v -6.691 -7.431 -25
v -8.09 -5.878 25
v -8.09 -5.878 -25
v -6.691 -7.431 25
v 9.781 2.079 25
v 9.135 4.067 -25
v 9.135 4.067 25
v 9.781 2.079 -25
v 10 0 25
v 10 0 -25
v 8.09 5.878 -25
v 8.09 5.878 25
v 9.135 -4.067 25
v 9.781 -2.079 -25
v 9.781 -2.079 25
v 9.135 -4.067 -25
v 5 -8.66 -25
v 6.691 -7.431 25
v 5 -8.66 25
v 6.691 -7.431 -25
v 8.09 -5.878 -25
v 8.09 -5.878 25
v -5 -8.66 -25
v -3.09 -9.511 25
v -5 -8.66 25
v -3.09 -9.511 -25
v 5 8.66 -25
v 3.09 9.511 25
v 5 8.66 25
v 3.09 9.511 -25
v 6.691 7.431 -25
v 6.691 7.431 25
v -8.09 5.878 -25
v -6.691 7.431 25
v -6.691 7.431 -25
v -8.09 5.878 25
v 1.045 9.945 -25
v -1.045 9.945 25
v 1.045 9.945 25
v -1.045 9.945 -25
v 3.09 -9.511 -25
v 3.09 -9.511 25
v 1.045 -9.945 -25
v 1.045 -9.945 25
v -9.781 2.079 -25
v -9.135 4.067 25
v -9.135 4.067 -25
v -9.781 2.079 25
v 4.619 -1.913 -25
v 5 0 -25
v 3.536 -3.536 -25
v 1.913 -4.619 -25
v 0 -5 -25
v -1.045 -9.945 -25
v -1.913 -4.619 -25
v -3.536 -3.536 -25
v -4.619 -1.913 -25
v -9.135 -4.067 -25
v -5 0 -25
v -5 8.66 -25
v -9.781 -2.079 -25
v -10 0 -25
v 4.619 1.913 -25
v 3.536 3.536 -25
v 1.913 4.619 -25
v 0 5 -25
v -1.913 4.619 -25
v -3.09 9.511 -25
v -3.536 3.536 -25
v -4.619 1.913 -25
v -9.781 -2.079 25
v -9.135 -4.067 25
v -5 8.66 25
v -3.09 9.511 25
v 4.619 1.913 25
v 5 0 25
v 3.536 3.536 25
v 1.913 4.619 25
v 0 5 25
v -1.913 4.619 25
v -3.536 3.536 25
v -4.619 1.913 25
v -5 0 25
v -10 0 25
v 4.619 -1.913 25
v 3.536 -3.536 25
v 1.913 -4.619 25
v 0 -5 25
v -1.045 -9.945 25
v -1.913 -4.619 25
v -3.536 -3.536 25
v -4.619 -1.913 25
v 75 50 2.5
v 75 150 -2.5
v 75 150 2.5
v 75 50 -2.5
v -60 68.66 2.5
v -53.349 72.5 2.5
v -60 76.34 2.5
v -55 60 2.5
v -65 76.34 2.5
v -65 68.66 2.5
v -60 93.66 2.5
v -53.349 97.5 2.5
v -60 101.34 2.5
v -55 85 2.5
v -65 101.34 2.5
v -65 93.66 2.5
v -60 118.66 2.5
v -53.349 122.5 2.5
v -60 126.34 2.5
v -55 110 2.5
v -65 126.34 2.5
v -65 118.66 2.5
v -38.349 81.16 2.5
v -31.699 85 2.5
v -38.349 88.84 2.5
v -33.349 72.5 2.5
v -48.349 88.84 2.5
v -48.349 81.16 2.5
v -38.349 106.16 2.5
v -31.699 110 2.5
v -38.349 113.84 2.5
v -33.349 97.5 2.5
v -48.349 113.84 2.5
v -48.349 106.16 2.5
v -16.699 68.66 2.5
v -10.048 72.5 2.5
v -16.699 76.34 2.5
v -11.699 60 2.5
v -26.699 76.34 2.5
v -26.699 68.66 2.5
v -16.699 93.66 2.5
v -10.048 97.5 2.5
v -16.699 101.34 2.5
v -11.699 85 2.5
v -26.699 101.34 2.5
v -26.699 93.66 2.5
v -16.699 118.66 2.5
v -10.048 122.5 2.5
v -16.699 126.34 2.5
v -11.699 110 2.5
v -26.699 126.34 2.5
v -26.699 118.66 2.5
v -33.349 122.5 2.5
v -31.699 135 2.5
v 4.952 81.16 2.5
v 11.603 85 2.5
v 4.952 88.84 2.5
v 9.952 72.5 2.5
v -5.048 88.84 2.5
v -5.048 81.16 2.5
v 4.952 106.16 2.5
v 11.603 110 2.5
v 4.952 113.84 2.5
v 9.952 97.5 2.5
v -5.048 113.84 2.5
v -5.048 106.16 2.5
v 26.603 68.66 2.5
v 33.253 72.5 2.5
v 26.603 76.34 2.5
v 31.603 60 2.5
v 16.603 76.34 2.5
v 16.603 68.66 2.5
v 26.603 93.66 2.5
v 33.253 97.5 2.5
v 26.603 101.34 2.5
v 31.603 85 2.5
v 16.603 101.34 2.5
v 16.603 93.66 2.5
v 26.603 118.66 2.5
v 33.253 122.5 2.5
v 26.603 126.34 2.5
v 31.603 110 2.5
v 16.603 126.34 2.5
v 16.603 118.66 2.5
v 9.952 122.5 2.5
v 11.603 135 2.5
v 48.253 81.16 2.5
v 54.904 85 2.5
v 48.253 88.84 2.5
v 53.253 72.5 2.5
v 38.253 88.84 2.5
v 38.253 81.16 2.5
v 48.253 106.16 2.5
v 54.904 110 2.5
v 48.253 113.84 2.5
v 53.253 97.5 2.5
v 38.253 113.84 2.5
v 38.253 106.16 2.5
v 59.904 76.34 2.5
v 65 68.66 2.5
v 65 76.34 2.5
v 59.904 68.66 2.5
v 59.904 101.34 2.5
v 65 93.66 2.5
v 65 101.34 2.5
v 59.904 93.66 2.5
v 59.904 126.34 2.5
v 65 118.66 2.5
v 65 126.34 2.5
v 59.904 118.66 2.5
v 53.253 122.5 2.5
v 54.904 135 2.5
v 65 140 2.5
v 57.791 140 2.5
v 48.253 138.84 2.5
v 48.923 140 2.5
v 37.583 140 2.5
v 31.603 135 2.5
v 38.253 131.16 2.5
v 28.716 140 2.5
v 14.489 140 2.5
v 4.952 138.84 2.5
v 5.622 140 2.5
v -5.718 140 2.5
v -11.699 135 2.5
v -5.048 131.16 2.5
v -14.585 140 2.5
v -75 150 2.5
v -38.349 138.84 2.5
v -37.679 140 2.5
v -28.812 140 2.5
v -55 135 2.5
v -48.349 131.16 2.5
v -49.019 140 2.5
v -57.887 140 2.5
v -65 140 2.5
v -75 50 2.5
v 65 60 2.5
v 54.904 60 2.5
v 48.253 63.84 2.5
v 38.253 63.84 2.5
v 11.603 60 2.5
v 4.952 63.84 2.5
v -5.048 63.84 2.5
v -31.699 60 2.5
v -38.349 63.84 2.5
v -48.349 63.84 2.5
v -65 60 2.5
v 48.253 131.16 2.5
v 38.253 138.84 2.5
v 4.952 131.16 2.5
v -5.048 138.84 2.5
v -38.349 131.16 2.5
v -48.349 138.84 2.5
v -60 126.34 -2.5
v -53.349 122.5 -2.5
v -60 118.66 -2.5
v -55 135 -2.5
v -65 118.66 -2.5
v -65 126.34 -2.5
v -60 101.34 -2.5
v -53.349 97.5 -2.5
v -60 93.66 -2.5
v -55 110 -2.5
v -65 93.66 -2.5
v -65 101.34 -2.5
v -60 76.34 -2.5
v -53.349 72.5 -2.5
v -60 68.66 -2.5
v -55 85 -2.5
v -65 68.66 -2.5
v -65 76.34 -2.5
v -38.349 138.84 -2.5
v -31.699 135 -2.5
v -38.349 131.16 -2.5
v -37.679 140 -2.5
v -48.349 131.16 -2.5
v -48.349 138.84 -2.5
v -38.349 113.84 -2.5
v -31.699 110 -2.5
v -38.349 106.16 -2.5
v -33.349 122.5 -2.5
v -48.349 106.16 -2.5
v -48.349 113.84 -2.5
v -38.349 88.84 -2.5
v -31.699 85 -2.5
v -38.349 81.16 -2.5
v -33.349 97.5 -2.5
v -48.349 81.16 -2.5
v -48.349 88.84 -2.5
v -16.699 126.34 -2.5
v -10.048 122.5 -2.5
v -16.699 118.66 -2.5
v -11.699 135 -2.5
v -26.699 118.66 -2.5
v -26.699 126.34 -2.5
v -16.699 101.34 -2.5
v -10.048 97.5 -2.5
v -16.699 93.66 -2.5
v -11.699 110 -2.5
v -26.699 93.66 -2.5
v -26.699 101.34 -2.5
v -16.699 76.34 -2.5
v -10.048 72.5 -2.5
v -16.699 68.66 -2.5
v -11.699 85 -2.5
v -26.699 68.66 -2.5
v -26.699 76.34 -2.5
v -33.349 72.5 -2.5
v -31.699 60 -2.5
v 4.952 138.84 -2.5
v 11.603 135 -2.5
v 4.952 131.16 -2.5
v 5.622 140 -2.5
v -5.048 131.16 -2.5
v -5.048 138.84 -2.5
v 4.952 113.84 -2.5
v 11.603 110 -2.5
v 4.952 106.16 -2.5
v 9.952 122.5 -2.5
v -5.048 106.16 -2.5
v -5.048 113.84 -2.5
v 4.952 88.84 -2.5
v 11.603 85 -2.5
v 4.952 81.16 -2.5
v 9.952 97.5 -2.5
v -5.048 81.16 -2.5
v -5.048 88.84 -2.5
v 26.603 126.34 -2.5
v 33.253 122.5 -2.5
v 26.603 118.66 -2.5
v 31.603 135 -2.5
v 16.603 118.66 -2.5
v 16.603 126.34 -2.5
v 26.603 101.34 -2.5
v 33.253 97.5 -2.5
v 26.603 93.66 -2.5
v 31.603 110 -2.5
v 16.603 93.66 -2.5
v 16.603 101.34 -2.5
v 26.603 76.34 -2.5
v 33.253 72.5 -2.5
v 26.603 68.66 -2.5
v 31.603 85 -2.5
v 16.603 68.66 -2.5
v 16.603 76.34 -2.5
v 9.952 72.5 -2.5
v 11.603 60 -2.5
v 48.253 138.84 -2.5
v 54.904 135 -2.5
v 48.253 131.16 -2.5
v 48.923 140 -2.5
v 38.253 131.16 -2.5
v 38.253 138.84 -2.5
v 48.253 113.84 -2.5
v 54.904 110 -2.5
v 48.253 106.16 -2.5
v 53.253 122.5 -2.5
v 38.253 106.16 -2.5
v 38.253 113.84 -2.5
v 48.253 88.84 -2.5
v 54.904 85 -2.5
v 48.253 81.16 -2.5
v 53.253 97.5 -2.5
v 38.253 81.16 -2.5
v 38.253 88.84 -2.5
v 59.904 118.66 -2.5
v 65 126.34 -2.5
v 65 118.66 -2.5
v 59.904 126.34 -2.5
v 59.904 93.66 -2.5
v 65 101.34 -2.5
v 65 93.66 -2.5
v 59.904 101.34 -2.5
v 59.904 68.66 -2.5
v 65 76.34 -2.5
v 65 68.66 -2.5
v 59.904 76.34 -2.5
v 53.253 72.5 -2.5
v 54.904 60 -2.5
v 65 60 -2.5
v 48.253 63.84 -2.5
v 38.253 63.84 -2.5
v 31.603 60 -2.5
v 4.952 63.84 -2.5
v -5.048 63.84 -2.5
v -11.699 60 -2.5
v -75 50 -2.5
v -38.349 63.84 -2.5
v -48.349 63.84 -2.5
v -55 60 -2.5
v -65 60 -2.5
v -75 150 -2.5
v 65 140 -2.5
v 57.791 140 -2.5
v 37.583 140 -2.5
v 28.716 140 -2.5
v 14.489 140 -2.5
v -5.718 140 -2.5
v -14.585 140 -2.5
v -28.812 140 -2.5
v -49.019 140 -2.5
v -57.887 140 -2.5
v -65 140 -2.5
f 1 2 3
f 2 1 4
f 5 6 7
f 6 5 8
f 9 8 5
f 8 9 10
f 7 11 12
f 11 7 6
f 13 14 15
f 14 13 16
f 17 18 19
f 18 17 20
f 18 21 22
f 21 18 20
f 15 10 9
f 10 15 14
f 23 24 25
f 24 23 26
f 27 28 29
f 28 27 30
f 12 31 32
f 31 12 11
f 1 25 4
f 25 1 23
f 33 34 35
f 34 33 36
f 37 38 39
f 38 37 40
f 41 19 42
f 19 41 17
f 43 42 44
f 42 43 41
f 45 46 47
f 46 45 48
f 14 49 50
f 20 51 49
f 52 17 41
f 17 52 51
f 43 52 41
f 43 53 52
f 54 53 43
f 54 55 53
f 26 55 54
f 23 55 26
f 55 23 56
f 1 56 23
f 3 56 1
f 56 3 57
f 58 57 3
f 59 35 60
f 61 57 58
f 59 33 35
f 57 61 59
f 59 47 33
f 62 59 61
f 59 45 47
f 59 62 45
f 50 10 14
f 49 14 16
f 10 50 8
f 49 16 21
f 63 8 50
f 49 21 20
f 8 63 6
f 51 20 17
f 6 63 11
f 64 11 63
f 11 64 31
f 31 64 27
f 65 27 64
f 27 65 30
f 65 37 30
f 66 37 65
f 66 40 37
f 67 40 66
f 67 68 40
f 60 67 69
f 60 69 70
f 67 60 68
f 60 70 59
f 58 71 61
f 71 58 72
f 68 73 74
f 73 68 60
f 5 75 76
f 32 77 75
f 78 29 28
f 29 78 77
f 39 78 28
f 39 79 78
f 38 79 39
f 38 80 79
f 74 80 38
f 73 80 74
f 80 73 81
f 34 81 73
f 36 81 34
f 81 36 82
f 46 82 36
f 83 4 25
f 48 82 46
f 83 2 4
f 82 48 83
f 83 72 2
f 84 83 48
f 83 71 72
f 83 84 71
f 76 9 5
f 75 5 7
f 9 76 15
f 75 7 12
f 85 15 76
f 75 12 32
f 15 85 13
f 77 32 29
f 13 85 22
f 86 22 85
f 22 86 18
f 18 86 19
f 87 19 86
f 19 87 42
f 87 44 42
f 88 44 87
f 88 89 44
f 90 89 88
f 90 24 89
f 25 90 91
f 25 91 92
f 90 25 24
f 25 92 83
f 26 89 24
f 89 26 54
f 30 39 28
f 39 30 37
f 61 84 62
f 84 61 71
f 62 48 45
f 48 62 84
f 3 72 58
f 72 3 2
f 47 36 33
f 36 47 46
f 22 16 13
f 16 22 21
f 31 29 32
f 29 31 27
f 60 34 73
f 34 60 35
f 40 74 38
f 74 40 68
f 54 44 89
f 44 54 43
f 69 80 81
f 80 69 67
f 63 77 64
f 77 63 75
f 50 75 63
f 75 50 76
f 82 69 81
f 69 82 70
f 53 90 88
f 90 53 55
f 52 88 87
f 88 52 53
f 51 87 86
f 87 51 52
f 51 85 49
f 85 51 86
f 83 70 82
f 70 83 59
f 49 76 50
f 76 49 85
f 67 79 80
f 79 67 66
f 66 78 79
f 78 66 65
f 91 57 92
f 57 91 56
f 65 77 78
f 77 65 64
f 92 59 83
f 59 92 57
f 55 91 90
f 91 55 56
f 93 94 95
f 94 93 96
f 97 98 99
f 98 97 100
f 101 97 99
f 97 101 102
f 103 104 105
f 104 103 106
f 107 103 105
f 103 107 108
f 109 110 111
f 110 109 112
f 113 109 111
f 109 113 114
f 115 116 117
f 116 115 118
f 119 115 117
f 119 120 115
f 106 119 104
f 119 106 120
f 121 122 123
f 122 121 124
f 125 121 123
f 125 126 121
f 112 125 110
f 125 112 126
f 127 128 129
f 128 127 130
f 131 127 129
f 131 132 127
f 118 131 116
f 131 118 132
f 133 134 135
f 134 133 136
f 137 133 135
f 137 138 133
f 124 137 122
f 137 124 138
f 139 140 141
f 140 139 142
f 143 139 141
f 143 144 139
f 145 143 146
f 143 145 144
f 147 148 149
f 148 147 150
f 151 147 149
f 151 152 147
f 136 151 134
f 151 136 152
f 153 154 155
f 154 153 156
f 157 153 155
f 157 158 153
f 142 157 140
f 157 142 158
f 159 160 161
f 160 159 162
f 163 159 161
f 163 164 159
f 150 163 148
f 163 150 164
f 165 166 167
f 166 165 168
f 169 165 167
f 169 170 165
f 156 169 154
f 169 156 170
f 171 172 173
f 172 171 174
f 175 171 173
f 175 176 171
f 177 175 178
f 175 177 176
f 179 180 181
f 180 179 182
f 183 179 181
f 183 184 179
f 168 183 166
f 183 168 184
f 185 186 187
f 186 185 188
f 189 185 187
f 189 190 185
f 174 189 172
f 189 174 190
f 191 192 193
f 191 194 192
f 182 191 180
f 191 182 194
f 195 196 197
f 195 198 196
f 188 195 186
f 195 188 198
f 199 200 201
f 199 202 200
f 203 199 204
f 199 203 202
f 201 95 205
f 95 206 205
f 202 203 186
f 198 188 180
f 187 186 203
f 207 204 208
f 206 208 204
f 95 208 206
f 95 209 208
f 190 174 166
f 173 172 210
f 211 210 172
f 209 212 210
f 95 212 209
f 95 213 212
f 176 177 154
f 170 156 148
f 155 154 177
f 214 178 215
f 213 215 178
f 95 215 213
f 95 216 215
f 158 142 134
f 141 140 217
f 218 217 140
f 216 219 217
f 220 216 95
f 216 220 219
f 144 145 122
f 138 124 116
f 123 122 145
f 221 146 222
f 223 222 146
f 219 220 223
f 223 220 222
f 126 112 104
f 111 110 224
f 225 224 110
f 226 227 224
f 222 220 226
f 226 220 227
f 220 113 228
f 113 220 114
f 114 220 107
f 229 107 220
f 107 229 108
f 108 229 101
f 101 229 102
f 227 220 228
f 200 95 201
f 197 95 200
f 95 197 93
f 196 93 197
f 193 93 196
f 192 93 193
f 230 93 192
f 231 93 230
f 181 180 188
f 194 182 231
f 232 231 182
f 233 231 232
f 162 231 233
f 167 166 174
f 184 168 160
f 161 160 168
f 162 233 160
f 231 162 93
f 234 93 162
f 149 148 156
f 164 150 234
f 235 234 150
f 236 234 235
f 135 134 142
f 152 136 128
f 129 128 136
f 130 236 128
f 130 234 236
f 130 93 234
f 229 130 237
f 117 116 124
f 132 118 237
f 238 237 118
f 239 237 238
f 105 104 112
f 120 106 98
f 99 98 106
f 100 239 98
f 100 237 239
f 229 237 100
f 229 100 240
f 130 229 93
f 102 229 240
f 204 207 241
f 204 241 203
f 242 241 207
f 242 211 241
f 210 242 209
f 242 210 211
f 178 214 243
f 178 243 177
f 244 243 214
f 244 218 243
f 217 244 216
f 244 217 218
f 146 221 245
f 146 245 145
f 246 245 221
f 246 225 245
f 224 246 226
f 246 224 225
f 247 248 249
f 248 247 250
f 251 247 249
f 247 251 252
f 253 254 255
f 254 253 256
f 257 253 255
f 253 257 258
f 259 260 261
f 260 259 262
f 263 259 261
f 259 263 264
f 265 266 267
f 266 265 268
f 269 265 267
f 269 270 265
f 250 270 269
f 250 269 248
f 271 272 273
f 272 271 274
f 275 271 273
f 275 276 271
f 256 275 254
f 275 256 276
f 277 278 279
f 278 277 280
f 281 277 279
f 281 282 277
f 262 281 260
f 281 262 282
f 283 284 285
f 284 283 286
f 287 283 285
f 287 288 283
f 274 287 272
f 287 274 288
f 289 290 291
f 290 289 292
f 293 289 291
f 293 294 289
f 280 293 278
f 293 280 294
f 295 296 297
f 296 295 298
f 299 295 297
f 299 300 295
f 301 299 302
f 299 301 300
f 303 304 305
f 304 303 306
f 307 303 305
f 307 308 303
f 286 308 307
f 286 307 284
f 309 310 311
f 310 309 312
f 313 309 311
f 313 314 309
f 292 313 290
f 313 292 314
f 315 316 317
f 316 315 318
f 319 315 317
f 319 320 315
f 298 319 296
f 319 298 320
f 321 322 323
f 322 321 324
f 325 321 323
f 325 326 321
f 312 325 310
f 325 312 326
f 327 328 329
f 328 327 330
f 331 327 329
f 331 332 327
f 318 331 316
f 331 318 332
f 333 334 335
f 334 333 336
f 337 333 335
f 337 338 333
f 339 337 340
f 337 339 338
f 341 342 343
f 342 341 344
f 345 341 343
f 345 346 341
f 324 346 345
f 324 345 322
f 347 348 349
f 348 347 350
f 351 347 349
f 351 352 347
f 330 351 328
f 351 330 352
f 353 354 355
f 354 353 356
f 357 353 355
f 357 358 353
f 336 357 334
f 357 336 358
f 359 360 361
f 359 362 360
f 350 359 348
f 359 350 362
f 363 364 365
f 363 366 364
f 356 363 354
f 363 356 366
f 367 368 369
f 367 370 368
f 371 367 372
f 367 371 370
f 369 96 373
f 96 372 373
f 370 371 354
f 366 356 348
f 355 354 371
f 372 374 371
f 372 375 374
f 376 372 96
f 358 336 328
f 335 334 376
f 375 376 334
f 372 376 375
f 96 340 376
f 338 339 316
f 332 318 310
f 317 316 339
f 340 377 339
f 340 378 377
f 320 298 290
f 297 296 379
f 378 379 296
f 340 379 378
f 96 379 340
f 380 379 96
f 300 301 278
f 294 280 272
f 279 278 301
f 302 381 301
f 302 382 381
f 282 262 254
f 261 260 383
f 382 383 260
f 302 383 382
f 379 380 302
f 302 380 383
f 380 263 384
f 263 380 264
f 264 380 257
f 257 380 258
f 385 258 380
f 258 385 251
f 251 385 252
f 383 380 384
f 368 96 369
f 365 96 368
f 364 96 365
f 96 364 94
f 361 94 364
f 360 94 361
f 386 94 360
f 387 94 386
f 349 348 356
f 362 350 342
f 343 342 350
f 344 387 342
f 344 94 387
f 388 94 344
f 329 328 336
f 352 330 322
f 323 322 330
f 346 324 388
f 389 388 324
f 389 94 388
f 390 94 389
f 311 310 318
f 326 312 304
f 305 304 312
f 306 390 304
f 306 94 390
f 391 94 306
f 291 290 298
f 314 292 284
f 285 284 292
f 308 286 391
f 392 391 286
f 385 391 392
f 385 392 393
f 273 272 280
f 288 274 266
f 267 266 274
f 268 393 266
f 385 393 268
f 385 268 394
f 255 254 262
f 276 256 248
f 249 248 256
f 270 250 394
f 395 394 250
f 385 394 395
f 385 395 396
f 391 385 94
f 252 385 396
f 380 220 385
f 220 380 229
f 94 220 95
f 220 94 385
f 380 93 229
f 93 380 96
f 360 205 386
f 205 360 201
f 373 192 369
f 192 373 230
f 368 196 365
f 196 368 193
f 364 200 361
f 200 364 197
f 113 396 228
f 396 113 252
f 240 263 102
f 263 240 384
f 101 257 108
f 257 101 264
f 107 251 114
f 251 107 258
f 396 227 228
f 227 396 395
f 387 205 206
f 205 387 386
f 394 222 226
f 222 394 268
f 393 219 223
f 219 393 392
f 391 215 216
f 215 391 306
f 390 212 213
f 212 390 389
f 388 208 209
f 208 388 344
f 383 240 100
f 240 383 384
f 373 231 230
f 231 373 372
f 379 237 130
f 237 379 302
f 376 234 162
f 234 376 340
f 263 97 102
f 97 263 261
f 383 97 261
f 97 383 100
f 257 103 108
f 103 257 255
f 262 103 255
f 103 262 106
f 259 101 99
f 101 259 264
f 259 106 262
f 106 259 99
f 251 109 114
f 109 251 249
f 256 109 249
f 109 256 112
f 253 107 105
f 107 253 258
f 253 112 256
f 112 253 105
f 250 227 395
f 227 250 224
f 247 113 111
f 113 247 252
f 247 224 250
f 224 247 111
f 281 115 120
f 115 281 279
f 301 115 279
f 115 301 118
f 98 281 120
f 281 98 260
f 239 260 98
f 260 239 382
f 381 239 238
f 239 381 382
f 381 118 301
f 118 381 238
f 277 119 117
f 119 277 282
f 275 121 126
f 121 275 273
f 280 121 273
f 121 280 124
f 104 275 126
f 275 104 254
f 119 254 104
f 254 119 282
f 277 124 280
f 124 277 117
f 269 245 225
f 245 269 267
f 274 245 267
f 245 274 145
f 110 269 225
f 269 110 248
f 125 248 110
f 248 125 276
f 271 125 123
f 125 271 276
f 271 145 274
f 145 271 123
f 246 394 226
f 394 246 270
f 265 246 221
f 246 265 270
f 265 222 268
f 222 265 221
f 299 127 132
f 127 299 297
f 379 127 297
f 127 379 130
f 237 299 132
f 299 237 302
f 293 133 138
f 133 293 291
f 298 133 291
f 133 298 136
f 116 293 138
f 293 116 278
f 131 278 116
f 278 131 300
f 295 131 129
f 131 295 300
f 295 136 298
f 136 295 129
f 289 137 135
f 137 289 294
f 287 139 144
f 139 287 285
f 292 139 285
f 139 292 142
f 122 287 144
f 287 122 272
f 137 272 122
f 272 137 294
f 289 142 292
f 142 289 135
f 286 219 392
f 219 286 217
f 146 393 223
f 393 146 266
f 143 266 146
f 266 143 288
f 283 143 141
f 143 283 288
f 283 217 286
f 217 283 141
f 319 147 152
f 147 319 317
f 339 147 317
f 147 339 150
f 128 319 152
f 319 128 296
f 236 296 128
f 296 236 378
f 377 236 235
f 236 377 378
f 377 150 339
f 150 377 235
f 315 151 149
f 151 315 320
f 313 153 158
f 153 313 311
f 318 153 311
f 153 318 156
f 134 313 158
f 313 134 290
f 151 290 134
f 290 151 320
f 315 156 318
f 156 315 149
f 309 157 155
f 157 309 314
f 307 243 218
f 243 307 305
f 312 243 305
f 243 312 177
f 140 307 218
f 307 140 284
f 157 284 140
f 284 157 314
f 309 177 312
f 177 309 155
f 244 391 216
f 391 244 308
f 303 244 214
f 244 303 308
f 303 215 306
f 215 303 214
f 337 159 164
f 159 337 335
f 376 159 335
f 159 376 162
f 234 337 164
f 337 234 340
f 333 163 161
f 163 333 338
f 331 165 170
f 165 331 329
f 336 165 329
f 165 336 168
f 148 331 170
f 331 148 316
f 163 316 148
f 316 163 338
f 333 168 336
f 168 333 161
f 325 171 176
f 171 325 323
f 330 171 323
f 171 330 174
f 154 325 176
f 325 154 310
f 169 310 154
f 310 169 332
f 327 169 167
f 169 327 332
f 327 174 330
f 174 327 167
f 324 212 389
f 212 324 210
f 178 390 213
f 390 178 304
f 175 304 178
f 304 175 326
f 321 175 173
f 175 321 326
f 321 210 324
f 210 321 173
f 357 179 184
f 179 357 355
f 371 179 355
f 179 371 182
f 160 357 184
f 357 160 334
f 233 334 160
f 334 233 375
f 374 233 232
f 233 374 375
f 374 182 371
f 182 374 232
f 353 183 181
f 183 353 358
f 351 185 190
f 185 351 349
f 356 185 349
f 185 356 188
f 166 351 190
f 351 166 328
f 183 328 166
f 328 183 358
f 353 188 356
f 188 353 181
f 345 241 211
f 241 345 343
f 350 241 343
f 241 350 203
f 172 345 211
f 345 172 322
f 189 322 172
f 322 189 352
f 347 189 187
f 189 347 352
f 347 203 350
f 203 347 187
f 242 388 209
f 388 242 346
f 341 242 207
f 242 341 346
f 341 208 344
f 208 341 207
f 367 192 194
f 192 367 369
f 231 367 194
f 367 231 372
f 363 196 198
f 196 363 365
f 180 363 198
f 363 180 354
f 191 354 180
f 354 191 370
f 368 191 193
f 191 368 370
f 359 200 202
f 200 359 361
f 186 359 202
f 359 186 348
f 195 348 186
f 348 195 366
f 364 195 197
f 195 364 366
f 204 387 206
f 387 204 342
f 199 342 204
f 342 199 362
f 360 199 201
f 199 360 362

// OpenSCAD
// utils

// Core geometric primitives.
tube(50, 20,10);
translate([0,100,0]) plane(150, 100, 5, 0.1);

module tube(length, out_dia, in_dia) {
    difference() {
        cylinder(h=length,r=out_dia/2,center=true);
        cylinder(h=length+0.1,r=in_dia/2,center=true);
    }
}

module wheel(whe_diam, whe_heig, pin_ratio, pin_dia) {
    border_z = whe_heig+1.0;
    border_d = whe_diam+5.0;
    nb_pins = pin_ratio * whe_diam;
    alpha = 360 / nb_pins;
    
    module border() {
        color("Yellow") cylinder(h=1.0, r=border_d/2, center=true);
    }
    
    module gear() {
        module pins() {
            color("Purple") for (i = [1:nb_pins]) {
                translate([sin(i*alpha)*whe_diam/2,cos(i*alpha)*whe_diam/2,0]) cylinder(h=whe_heig+0.1, r=pin_dia/2, center=true);
            }
        }
        difference() {
            color("Green") cylinder(h=whe_heig, r=whe_diam/2, center=true);
            pins();
        }
    }
    
    union() {
        translate([0,0, border_z/2]) border();
        gear();
        translate([0,0,-border_z/2]) border();
    }
}

module plane(width, length, height, fill) {
    
    module grid(size,cell_hole,cell_wall) {
        dx=cell_hole*sqrt(3)+cell_wall*sqrt(3);
        dy=cell_hole+cell_wall;
        
        translate(-size/2) for (i = [0:ceil(size[0]/dx)*2]) {
            for (j = [0:ceil(size[1]/dy)]) {
                translate([i*dx/2,j*dy - i%2*dy/2,-0.1]) cylinder(d=cell_hole,h=size[2]+0.2,$fn=6);
                if (i%2 == 1) {
                    translate([i*dx/2,j*dy + i%2*dy/2,-0.1]) cylinder(d=cell_hole,h=size[2]+0.2,$fn=6);
                }
            }
        }
    }
    
    module create_grid(size,cell_hole,wall) {
        b = 2*wall;
        b_size = [size[0]-2*b,size[1]-2*b,size[2]+0.2];
        
        union() {
            difference() {
                cube(size=size, center=true);
                cube(size=b_size, center=true);
            }
            difference() {
                cube(size=size, center=true);
                grid(size=b_size, cell_hole=cell_hole, cell_wall=wall);
            }
        }
    }
    
    size = [width, length, height];
    wall = fill * min(width, length) / 2;
    hole = wall /fill * (1-fill);
    test = (min(width, length) - 2* wall) * fill / wall*2;
    test2 = ceil(test);
    hole2 = (min(width, length) - 2* wall) / test2 - wall/2;
    create_grid(size=size,cell_hole=hole2,wall=wall);
}
